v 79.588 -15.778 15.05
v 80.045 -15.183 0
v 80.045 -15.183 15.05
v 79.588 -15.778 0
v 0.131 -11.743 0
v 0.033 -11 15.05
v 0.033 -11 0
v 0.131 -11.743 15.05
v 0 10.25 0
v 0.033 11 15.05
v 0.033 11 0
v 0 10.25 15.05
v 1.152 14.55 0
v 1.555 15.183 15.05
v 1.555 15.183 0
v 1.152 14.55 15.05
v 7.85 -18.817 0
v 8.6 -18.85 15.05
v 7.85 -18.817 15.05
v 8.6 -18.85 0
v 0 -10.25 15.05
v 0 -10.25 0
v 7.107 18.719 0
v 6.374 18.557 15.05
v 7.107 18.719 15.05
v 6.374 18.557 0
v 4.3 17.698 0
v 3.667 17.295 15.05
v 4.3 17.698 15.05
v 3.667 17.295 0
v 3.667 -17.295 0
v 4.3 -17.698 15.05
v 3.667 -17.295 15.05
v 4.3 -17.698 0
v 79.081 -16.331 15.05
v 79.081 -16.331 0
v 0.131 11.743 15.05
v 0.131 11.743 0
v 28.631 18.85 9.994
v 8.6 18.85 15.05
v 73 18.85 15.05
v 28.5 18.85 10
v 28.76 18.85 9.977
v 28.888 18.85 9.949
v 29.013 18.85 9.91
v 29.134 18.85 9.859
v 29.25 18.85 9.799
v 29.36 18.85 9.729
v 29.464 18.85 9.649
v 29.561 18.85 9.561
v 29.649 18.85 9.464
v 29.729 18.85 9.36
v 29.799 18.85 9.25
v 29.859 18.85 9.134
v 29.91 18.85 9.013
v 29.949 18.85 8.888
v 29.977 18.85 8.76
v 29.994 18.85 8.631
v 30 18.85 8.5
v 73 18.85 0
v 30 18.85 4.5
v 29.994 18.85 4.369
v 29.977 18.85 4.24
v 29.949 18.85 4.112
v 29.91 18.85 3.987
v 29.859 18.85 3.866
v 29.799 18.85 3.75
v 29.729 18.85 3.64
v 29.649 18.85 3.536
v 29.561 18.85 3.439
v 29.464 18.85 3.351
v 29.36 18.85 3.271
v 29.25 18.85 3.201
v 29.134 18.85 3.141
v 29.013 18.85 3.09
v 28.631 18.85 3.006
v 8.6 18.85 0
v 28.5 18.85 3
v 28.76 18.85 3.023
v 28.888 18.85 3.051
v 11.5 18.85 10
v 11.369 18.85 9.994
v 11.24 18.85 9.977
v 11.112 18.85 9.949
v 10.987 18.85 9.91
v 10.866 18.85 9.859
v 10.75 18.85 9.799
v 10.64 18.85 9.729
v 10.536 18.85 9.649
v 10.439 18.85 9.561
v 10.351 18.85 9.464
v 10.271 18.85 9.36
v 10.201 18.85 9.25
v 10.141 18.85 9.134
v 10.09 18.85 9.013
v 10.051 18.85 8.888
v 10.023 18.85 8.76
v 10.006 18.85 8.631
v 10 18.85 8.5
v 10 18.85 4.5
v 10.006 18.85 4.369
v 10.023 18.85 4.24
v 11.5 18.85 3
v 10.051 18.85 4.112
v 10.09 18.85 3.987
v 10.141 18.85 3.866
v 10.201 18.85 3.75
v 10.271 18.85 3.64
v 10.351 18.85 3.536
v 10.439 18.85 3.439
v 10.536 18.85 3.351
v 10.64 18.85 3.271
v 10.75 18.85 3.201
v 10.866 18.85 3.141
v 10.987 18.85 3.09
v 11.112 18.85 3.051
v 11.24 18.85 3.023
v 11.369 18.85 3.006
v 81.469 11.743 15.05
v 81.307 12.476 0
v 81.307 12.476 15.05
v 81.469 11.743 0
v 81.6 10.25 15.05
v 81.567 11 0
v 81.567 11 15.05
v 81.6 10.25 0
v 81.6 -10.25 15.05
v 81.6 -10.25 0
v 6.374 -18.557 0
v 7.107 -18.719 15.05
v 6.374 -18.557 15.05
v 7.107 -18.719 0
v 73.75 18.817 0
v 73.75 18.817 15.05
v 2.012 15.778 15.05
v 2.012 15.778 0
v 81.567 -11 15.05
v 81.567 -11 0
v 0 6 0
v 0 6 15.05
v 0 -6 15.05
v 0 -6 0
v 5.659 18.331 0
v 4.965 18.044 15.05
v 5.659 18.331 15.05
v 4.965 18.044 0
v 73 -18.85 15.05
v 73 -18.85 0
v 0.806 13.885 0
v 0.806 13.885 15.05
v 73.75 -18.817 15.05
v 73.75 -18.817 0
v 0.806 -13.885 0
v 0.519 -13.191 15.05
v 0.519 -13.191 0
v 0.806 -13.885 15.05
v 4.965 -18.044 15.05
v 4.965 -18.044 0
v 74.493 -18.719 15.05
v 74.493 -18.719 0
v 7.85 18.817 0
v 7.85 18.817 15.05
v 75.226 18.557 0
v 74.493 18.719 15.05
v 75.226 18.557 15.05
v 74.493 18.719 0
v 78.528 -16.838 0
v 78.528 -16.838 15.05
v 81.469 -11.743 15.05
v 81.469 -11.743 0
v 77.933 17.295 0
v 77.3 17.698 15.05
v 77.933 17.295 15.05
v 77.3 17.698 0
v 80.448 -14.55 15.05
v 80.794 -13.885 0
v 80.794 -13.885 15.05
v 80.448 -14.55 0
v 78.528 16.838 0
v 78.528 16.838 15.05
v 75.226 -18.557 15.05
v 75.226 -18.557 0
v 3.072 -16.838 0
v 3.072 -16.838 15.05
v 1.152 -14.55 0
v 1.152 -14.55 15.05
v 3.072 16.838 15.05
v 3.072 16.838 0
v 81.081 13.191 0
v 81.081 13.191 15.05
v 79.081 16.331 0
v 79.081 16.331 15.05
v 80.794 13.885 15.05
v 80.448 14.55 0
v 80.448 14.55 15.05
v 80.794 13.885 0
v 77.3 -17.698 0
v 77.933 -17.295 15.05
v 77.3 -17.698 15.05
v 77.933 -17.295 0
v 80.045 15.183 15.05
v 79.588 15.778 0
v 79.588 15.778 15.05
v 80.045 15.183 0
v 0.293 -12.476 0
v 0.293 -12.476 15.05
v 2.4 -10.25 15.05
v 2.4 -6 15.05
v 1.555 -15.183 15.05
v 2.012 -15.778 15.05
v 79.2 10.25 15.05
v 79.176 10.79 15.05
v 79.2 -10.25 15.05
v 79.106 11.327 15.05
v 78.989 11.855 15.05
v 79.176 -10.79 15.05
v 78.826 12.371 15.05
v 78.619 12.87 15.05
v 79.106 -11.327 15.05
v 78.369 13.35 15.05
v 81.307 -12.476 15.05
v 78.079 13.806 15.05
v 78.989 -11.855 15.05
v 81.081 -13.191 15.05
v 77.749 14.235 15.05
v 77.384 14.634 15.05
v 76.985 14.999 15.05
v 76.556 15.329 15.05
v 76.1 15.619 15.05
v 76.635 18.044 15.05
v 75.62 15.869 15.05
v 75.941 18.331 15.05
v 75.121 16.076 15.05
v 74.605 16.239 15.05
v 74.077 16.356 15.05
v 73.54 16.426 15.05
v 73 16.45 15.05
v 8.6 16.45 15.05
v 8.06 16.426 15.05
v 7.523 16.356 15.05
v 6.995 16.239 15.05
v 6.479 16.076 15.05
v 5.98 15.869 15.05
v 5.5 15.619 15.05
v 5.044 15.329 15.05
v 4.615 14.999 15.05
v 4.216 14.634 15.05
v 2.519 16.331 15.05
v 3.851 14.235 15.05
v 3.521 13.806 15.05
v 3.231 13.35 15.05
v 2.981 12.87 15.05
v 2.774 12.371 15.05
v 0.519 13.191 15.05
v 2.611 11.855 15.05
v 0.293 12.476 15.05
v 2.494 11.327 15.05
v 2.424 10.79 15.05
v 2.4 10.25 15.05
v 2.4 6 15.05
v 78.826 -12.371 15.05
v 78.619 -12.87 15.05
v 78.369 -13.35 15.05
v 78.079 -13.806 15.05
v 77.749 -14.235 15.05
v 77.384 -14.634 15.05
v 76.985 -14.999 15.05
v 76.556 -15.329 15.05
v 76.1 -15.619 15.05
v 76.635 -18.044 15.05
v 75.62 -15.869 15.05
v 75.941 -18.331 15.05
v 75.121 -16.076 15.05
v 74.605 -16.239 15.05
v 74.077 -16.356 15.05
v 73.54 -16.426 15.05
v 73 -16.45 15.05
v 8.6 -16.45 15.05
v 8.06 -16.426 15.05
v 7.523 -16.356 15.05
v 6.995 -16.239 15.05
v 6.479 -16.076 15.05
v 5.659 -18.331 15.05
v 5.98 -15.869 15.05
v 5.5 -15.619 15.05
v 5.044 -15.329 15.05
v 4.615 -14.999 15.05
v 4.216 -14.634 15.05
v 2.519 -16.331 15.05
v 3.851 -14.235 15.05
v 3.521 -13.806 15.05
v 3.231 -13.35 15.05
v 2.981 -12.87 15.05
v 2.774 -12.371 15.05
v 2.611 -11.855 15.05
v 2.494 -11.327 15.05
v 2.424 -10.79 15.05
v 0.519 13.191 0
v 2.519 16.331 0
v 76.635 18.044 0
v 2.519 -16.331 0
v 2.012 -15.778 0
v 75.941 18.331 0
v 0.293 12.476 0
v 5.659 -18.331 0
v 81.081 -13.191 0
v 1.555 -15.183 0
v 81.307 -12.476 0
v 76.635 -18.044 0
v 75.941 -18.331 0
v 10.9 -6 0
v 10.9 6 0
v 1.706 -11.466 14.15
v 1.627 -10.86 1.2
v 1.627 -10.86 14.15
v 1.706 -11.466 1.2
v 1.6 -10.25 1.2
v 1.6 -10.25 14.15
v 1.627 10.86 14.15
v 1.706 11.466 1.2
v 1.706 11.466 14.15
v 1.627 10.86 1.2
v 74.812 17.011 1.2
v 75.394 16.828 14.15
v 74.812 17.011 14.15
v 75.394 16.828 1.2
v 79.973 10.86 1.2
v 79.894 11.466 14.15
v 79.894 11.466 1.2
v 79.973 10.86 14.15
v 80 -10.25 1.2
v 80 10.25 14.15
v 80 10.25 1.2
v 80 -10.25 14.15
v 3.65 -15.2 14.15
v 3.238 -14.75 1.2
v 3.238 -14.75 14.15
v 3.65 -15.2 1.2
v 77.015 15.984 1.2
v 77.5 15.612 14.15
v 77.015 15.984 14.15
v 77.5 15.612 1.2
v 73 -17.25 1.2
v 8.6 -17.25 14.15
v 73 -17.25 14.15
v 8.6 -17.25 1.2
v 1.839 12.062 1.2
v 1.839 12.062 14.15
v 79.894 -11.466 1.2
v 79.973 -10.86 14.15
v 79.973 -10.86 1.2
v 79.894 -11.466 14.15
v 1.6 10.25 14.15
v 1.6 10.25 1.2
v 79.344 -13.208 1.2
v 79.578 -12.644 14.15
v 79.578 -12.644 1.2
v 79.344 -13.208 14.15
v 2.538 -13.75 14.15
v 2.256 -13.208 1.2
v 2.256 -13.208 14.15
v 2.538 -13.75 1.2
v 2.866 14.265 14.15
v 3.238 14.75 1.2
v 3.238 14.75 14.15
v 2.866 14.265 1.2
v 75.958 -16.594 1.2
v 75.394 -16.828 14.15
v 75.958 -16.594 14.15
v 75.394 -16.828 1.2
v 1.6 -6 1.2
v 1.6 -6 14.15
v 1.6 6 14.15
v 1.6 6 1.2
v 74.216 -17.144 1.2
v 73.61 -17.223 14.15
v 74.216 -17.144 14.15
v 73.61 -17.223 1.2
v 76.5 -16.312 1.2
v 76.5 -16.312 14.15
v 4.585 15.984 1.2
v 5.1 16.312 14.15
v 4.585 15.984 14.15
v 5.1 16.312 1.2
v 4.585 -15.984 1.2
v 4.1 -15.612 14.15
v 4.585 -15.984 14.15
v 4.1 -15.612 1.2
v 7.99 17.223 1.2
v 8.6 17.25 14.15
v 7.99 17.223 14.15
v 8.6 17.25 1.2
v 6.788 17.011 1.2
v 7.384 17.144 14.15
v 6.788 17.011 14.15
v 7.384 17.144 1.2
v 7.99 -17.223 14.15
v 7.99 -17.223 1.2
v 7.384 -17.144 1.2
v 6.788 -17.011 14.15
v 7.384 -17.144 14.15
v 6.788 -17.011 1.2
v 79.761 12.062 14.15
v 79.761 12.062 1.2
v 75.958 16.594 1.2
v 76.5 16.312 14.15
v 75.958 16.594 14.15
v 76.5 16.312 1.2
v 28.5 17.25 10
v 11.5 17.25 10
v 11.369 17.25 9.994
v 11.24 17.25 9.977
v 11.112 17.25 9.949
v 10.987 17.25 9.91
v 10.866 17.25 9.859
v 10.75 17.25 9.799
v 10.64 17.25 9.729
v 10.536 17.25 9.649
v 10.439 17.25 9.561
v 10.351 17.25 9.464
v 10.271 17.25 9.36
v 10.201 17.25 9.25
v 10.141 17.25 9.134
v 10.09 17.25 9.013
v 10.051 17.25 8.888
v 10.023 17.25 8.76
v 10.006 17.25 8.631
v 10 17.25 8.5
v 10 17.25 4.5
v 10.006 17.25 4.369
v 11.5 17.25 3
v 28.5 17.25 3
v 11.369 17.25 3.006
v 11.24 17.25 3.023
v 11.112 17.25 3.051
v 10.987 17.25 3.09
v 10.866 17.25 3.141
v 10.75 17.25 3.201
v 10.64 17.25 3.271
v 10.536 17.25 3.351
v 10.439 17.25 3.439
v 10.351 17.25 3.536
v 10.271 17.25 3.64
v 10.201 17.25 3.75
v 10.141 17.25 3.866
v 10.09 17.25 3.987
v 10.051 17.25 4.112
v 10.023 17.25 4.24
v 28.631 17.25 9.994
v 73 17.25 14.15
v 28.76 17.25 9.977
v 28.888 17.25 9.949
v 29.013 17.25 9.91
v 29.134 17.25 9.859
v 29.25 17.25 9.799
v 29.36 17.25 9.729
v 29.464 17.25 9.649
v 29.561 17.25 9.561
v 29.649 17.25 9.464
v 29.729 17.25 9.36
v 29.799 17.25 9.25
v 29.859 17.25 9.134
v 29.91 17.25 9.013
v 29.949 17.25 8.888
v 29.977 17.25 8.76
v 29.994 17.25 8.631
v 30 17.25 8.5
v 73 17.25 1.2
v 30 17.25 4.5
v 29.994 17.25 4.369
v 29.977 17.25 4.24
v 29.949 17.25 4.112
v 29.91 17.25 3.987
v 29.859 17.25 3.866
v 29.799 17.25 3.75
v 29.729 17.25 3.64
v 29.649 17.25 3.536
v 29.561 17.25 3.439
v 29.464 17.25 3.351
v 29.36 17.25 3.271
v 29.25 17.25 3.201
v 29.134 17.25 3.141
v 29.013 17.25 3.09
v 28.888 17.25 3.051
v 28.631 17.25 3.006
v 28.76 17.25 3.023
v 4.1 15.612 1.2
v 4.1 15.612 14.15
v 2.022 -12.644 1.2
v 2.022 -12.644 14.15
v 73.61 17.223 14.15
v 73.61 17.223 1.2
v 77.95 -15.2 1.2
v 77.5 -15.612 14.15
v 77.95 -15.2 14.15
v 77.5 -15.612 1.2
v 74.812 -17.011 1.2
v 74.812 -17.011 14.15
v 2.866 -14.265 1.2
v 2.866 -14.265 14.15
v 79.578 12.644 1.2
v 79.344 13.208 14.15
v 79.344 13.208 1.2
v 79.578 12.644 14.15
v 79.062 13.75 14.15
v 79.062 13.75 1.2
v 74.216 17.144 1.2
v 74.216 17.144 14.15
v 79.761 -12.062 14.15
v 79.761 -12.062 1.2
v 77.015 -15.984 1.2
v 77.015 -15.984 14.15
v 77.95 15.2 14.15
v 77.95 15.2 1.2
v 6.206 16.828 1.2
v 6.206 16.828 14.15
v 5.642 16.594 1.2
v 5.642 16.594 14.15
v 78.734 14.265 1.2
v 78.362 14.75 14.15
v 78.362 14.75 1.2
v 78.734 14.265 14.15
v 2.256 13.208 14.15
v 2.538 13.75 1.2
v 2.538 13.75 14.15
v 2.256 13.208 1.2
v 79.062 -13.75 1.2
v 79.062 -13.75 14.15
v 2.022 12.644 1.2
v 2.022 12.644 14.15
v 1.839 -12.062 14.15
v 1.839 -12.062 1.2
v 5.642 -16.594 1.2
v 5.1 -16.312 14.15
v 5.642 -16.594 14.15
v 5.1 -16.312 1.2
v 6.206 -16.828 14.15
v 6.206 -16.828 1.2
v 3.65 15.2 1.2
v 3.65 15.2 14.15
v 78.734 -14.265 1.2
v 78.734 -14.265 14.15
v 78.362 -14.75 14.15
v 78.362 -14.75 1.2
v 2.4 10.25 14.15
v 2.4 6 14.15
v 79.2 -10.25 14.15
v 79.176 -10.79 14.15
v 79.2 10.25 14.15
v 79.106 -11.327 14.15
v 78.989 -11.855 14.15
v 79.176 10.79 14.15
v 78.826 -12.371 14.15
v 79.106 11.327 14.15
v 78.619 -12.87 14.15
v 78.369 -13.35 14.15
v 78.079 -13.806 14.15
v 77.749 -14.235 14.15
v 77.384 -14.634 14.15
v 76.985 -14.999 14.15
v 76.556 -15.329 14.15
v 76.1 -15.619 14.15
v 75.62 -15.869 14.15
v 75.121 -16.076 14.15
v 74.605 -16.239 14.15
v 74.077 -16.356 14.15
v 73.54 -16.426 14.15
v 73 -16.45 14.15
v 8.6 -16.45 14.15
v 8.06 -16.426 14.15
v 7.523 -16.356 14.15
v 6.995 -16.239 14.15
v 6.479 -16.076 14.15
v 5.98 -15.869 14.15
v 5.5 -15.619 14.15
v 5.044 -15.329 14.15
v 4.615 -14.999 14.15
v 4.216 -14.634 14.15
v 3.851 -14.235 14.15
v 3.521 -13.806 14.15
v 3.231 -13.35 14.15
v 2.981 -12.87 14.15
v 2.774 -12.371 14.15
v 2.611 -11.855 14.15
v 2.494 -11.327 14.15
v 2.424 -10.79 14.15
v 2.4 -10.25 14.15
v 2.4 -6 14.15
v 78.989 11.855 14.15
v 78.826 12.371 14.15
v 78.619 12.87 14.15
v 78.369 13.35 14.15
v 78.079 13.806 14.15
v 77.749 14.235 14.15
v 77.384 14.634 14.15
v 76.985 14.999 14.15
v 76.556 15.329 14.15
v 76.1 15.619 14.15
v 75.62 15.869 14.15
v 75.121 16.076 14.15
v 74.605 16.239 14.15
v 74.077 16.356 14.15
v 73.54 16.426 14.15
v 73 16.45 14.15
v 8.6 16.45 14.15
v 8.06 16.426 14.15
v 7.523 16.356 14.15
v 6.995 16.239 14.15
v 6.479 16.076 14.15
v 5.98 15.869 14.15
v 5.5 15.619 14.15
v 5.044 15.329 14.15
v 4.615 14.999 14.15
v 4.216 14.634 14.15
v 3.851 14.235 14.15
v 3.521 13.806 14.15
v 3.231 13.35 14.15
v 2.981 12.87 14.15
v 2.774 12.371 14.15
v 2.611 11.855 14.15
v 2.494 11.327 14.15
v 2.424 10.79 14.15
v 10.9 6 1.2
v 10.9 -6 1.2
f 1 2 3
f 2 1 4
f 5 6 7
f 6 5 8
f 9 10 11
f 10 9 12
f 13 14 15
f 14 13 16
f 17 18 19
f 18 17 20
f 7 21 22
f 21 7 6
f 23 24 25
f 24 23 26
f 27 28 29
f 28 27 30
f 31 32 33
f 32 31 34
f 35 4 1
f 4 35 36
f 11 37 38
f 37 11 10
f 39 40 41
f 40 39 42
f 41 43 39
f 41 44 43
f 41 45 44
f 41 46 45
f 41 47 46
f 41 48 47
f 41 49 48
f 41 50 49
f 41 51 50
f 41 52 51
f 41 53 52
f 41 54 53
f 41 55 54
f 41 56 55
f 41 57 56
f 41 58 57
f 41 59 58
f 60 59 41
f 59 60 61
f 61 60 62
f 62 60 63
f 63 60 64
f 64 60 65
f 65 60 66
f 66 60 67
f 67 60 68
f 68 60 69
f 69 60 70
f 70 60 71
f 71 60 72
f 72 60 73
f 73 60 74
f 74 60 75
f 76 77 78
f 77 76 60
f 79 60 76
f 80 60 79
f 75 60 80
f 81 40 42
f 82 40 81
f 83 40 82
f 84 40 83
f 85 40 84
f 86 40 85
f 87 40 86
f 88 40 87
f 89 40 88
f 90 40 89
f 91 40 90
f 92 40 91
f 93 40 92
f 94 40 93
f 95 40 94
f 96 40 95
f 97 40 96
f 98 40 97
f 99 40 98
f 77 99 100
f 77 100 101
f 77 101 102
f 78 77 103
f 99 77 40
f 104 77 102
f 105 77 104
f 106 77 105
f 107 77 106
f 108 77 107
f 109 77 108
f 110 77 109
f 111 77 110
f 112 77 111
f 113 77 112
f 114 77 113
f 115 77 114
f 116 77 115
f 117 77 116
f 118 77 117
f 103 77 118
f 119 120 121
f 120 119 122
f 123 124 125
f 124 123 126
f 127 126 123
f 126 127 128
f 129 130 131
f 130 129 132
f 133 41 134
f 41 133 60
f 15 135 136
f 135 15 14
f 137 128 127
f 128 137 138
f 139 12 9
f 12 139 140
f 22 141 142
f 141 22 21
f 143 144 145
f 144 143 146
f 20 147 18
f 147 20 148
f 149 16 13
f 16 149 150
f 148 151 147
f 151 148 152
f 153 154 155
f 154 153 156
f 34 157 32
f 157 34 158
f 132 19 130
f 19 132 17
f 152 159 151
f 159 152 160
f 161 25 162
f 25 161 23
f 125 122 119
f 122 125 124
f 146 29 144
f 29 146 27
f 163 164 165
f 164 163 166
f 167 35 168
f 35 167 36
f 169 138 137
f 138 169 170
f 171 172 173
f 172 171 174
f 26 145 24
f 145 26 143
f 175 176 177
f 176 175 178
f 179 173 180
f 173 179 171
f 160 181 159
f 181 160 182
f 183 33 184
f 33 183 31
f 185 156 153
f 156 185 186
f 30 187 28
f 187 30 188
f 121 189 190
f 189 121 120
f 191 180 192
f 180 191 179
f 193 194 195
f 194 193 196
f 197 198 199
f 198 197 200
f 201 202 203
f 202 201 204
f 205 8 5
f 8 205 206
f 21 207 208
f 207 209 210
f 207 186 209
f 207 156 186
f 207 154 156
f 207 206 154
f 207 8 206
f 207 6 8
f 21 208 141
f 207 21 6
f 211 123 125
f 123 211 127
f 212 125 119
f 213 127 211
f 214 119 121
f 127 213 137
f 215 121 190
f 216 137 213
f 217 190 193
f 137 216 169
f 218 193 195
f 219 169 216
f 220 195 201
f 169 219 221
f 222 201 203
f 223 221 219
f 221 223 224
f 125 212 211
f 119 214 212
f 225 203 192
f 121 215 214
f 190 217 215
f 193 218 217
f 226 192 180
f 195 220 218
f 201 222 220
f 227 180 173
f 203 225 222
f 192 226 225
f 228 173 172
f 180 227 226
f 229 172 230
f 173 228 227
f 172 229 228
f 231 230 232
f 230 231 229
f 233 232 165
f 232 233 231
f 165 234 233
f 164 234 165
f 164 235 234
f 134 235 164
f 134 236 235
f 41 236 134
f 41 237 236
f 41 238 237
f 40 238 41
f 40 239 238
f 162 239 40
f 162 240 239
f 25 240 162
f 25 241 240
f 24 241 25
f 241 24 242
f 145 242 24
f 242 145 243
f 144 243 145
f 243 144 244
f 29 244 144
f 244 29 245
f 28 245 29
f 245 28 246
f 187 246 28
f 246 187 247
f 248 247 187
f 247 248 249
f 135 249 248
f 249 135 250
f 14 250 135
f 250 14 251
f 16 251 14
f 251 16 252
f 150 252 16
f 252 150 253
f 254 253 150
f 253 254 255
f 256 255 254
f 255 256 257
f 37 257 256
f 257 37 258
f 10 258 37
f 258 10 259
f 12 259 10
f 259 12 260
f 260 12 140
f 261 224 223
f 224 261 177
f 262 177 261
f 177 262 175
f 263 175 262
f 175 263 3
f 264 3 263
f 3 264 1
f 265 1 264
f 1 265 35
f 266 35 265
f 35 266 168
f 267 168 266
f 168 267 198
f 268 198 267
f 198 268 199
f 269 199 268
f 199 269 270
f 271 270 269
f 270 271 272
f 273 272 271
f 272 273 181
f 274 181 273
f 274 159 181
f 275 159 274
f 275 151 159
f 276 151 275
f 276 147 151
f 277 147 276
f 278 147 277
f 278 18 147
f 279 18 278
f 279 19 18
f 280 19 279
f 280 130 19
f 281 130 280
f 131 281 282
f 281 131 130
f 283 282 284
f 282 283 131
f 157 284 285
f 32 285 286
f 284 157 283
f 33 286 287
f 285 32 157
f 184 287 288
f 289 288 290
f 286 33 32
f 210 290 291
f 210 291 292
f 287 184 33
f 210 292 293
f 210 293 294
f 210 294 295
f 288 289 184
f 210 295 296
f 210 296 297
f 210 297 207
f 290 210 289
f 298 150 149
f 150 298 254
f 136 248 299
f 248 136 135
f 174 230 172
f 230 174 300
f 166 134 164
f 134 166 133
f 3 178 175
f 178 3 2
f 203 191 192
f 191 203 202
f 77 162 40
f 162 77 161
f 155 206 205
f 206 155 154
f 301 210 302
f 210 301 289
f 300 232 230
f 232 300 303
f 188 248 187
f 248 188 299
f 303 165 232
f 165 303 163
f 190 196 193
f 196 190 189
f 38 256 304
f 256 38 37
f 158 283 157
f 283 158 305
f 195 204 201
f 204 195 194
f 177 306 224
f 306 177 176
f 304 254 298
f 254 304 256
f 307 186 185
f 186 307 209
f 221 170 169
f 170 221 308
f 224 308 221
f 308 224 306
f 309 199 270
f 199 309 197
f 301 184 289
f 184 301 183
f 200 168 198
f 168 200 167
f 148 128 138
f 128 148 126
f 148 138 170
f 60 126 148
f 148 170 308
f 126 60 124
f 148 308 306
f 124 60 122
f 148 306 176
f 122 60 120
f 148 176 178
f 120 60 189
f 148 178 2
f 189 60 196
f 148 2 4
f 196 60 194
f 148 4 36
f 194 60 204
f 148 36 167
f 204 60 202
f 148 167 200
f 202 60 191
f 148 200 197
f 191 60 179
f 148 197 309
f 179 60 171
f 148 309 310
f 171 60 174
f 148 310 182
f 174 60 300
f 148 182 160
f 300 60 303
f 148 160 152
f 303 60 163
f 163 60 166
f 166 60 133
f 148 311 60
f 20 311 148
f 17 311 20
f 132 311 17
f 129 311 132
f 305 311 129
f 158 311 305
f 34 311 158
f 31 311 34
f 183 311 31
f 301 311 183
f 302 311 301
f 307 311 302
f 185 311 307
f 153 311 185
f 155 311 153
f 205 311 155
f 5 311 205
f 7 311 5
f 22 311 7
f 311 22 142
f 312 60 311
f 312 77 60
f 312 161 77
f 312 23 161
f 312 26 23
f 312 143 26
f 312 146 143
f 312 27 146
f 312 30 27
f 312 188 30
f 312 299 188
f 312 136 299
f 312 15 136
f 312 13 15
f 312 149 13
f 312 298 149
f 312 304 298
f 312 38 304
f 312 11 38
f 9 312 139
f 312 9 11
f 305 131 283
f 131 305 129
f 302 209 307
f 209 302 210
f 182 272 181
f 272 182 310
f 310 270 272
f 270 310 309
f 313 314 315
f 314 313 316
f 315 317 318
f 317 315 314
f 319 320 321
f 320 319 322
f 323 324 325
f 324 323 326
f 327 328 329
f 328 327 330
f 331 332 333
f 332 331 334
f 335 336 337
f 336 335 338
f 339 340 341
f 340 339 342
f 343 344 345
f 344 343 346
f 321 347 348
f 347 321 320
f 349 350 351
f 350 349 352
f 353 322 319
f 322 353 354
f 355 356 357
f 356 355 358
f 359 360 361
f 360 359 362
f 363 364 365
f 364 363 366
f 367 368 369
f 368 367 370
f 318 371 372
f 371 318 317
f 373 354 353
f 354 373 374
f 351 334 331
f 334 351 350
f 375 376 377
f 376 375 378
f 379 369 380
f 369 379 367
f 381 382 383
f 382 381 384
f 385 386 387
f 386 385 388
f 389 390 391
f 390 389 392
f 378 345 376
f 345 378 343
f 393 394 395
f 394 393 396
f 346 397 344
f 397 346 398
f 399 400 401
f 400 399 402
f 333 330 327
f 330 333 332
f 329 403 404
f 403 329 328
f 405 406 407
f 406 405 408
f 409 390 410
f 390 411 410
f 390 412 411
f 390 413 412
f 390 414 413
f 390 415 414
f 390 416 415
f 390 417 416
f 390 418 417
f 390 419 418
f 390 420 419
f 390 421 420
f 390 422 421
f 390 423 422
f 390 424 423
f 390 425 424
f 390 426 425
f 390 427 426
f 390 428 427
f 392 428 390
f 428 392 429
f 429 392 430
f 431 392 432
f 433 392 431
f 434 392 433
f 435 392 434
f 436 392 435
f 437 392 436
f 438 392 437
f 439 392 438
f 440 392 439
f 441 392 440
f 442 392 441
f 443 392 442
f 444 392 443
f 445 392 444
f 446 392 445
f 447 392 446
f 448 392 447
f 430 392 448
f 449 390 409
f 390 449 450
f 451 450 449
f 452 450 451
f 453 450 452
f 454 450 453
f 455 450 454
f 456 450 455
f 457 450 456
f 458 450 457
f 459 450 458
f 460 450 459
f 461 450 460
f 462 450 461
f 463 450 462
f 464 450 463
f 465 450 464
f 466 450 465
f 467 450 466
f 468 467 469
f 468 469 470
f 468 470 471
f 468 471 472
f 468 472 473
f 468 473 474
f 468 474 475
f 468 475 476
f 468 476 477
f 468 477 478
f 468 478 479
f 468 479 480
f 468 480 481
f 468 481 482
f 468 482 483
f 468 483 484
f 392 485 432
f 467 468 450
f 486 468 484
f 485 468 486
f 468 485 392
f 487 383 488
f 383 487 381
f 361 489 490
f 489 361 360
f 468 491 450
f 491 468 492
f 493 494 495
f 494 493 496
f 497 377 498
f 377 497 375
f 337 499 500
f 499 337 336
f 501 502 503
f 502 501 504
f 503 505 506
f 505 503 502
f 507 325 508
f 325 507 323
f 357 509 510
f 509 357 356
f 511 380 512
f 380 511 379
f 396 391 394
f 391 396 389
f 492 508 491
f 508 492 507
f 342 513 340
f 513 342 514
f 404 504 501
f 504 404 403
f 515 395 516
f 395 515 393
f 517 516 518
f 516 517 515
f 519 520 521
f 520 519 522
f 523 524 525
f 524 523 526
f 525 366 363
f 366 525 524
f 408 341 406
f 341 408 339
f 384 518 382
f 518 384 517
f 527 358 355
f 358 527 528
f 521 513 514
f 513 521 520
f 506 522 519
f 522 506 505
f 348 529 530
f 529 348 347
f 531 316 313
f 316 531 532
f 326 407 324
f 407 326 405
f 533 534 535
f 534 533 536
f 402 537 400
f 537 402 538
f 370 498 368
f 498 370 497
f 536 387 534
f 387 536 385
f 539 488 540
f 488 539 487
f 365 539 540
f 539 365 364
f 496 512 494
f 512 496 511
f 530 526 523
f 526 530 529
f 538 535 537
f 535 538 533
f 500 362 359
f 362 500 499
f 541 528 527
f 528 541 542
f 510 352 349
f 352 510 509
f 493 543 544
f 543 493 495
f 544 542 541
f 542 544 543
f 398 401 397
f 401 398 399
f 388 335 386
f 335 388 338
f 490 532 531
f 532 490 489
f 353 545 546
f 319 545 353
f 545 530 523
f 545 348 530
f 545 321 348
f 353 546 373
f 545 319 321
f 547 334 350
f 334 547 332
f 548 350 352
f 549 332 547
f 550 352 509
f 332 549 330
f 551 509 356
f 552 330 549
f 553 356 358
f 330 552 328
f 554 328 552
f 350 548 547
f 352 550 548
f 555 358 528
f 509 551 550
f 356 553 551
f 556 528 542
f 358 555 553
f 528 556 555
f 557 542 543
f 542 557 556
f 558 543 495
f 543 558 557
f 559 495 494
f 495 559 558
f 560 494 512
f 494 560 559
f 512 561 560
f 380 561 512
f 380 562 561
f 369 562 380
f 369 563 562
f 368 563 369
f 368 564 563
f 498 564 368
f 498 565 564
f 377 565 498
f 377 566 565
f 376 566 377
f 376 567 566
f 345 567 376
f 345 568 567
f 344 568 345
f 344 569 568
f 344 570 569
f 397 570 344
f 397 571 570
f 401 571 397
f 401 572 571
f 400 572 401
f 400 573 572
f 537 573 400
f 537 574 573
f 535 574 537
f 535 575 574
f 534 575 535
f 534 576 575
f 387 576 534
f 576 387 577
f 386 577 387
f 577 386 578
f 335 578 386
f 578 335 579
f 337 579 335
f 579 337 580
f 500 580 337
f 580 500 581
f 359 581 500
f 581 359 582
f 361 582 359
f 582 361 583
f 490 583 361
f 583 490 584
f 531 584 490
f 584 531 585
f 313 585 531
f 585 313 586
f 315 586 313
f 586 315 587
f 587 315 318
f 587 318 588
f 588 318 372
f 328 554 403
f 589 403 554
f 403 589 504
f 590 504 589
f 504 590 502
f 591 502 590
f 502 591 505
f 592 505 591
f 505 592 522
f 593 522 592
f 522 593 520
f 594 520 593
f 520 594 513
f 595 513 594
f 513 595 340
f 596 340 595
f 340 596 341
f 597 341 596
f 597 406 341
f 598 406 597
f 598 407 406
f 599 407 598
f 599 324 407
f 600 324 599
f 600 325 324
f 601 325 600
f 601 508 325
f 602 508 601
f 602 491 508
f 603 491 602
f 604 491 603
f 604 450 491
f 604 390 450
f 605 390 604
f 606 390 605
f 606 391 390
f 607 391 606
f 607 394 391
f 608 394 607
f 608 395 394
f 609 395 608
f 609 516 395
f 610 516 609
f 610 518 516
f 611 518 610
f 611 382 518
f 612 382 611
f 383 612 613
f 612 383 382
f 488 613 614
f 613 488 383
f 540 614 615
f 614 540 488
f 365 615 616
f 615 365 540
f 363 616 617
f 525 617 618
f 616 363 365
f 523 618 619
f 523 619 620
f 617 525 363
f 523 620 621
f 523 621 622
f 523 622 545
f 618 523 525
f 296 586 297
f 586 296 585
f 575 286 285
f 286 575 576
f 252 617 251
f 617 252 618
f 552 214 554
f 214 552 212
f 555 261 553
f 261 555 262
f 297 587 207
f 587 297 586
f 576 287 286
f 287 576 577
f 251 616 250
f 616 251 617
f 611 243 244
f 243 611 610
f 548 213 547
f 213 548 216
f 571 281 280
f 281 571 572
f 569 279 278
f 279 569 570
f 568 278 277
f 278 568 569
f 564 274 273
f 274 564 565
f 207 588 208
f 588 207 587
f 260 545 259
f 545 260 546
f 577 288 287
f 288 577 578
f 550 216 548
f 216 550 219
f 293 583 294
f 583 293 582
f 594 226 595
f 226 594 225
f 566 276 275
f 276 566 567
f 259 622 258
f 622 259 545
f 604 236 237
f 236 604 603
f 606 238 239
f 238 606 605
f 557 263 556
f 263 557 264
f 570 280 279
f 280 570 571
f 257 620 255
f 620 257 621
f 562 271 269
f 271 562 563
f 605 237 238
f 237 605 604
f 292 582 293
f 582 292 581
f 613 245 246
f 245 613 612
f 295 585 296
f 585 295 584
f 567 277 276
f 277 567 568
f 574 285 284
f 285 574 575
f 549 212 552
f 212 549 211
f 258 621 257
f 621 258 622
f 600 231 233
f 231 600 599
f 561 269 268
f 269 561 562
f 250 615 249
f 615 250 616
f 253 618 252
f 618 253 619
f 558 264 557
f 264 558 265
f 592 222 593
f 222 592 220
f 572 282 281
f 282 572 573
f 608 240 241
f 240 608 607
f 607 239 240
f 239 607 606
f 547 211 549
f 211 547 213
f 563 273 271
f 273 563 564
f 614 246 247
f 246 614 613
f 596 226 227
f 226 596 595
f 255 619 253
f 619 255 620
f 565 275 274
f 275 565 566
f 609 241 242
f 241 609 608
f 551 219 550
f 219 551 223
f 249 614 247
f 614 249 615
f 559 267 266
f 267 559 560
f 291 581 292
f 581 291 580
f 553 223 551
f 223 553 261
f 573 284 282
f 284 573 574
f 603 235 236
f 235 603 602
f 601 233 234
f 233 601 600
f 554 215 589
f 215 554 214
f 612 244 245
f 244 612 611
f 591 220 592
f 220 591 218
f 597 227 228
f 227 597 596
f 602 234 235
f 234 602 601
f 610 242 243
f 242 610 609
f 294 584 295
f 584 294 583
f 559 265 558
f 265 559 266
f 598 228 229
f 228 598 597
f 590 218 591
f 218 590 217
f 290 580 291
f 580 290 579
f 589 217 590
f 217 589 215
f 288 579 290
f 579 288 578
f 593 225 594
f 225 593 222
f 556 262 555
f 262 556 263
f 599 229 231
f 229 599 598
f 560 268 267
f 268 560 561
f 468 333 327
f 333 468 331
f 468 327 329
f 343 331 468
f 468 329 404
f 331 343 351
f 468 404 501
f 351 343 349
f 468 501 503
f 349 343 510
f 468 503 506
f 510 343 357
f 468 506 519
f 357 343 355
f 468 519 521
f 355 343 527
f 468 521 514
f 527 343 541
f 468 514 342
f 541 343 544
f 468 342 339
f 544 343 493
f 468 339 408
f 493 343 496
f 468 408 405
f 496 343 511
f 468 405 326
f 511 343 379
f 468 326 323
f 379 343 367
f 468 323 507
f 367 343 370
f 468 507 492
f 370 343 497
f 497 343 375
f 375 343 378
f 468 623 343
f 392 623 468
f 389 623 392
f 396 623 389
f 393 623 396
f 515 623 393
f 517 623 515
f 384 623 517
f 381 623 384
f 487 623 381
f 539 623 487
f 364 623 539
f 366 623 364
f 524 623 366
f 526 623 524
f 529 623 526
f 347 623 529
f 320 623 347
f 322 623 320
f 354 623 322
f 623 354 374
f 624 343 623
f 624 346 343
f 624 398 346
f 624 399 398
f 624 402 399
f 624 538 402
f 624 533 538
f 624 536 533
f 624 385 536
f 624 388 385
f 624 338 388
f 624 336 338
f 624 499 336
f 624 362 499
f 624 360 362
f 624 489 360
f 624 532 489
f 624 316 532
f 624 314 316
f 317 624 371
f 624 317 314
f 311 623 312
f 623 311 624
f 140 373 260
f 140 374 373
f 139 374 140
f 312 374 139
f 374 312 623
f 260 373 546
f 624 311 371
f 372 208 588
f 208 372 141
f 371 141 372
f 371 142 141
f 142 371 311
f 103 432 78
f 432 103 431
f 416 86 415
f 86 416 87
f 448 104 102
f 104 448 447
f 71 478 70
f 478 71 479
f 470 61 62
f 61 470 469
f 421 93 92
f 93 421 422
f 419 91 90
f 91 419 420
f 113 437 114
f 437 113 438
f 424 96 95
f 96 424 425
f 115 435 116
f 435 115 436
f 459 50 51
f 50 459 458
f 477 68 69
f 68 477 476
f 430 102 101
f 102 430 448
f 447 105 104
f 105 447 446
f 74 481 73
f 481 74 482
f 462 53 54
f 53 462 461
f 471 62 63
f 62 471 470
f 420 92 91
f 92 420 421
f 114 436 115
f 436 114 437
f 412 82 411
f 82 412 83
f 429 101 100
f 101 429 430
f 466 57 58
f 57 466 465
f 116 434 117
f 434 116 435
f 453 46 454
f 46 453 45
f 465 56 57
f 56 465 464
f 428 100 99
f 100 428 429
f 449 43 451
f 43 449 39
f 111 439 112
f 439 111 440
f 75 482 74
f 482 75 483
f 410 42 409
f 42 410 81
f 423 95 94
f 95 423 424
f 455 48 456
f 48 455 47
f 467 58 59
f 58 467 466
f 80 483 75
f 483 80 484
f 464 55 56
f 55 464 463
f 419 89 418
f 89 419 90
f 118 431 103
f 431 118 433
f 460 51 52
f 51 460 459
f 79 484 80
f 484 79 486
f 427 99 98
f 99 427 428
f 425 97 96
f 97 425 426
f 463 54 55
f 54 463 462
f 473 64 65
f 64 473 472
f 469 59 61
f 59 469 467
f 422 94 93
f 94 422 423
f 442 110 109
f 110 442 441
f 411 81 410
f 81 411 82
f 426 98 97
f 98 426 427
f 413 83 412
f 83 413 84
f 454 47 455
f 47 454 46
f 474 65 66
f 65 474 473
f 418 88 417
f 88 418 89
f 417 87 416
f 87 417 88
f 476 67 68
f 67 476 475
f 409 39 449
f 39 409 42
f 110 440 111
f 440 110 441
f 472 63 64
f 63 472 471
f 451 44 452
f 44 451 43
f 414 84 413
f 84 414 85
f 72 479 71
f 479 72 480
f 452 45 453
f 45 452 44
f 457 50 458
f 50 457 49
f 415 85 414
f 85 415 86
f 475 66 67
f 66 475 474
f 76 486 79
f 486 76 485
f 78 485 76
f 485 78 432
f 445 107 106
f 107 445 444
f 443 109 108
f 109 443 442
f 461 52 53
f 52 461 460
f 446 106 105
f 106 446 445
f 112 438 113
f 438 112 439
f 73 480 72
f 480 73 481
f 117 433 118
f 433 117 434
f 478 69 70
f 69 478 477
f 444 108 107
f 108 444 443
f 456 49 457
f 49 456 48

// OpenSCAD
// BYD DOLPHIN — BUMPER TPU COM SLOT LATERAL PARA LÂMINA CANIVETE
// V0.2 PARAMÉTRICA
// Protege traseira e laterais; face dos quatro controles aberta.
// O manual oficial identifica lock, unlock, boot, Start/Stop, indicador e chave mecânica.
// Eixos: X = comprimento, Y = largura, Z = espessura.
//
// IMPORTANTE: as dimensões da chave são preliminares e não oficiais.
// Medir a chave física antes de imprimir a peça completa.

$fn = 72;

// ===================== MEDIDAS DA CHAVE =====================
KEY_L = 78.0;       // comprimento do corpo, eixo X, mm
KEY_W = 34.0;       // largura máxima, eixo Y, mm
KEY_T = 14.5;       // espessura máxima, eixo Z, mm
KEY_R = 7.0;        // raio aproximado dos cantos em planta, mm

// ===================== FOLGAS / PAREDES TPU =====================
CLR_X = 0.40;
CLR_Y = 0.25;
CLR_Z = 0.35;
BACK = 1.20;
SIDE_WALL = 1.60;
FACE_CLEARANCE = 1.00;
LIP_IN = 0.80;
LIP_H = 0.90;

// ===================== ARGOLA =====================
RING_NOTCH_L = 11.0;
RING_NOTCH_W = 12.0;

// ===================== SLOT DA LÂMINA CANIVETE =====================
BLADE_SLOT_ENABLE = true;
BLADE_SLOT_SIDE = 1;       // +1 = parede Y positiva; -1 = parede Y negativa
BLADE_SLOT_X = 20.0;       // centro da janela ao longo de X
BLADE_SLOT_W = 20.0;       // largura/comprimento em X
BLADE_SLOT_Z = 6.5;        // centro da janela em Z a partir da base
BLADE_SLOT_H = 7.0;        // altura da janela em Z
BLADE_SLOT_R = 1.5;        // raio dos cantos

// Se a lâmina deve abrir com a capa instalada, comece com
// BLADE_SLOT_W = 20–25 mm e BLADE_SLOT_H = 7–9 mm.

// ===================== DIMENSÕES DERIVADAS =====================
INNER_L = KEY_L + CLR_X;
INNER_W = KEY_W + 2*CLR_Y;
INNER_T = KEY_T + CLR_Z;
OUTER_L = INNER_L + 2*SIDE_WALL;
OUTER_W = INNER_W + 2*SIDE_WALL;
WALL_H = max(1.0, INNER_T - FACE_CLEARANCE);
OUTER_H = BACK + WALL_H;
OUTER_R = min(KEY_R + SIDE_WALL, OUTER_W/2 - 0.30);
INNER_R = min(KEY_R, INNER_W/2 - 0.30);

// ===================== PRIMITIVAS =====================
module rounded2d(l, w, r) {
    hull() {
        for (x = [r, l-r])
            for (y = [-w/2+r, w/2-r])
                translate([x, y]) circle(r=r);
    }
}

module rounded_rect_centered_2d(w, h, r) {
    hull() {
        for (x = [-w/2+r, w/2-r])
            for (y = [-h/2+r, h/2-r])
                translate([x, y]) circle(r=r);
    }
}

module rounded_prism(l, w, h, r) {
    linear_extrude(height=h) rounded2d(l, w, r);
}

module rounded_slot_xz(w, h, r, depth) {
    rotate([90,0,0])
        linear_extrude(height=depth, center=true)
            rounded_rect_centered_2d(w, h, r);
}

module base_plate() {
    rounded_prism(OUTER_L, OUTER_W, BACK, OUTER_R);
}

module side_ring() {
    difference() {
        rounded_prism(OUTER_L, OUTER_W, OUTER_H, OUTER_R);
        translate([SIDE_WALL, 0, BACK-0.05])
            rounded_prism(INNER_L, INNER_W, WALL_H+0.20, INNER_R);
    }
}

module retention_lip() {
    difference() {
        translate([0, 0, BACK+WALL_H-LIP_H])
            rounded_prism(OUTER_L, OUTER_W, LIP_H, OUTER_R);
        translate([SIDE_WALL+LIP_IN, 0, BACK+WALL_H-LIP_H-0.05])
            rounded_prism(INNER_L-2*LIP_IN, INNER_W-2*LIP_IN,
                          LIP_H+0.20, max(0.5, INNER_R-LIP_IN));
    }
}

module ring_notch() {
    translate([-0.10, -RING_NOTCH_W/2, -0.10])
        cube([RING_NOTCH_L, RING_NOTCH_W, OUTER_H+0.30]);
}

module blade_slot() {
    if (BLADE_SLOT_ENABLE) {
        slot_y = BLADE_SLOT_SIDE > 0
            ? OUTER_W/2 - SIDE_WALL/2
            : -OUTER_W/2 + SIDE_WALL/2;
        translate([BLADE_SLOT_X, slot_y, BLADE_SLOT_Z])
            rounded_slot_xz(BLADE_SLOT_W, BLADE_SLOT_H, BLADE_SLOT_R,
                            SIDE_WALL+0.40);
    }
}

module bumper() {
    difference() {
        union() {
            base_plate();
            side_ring();
            retention_lip();
        }
        ring_notch();
        blade_slot();
    }
}

bumper();

// ===================== AJUSTE RÁPIDO =====================
// BLADE_SLOT_X = posição da janela ao longo da chave.
// BLADE_SLOT_W = largura/comprimento da janela no eixo X.
// BLADE_SLOT_Z = altura da janela no eixo Z.
// BLADE_SLOT_H = altura da janela no eixo Z.
// BLADE_SLOT_SIDE = lado da chave: +1 ou -1.
// BLADE_SLOT_R >= 1.5 mm reduz o risco de rasgo no TPU.
// Imprima primeiro um trecho de teste de 10–15 mm.
